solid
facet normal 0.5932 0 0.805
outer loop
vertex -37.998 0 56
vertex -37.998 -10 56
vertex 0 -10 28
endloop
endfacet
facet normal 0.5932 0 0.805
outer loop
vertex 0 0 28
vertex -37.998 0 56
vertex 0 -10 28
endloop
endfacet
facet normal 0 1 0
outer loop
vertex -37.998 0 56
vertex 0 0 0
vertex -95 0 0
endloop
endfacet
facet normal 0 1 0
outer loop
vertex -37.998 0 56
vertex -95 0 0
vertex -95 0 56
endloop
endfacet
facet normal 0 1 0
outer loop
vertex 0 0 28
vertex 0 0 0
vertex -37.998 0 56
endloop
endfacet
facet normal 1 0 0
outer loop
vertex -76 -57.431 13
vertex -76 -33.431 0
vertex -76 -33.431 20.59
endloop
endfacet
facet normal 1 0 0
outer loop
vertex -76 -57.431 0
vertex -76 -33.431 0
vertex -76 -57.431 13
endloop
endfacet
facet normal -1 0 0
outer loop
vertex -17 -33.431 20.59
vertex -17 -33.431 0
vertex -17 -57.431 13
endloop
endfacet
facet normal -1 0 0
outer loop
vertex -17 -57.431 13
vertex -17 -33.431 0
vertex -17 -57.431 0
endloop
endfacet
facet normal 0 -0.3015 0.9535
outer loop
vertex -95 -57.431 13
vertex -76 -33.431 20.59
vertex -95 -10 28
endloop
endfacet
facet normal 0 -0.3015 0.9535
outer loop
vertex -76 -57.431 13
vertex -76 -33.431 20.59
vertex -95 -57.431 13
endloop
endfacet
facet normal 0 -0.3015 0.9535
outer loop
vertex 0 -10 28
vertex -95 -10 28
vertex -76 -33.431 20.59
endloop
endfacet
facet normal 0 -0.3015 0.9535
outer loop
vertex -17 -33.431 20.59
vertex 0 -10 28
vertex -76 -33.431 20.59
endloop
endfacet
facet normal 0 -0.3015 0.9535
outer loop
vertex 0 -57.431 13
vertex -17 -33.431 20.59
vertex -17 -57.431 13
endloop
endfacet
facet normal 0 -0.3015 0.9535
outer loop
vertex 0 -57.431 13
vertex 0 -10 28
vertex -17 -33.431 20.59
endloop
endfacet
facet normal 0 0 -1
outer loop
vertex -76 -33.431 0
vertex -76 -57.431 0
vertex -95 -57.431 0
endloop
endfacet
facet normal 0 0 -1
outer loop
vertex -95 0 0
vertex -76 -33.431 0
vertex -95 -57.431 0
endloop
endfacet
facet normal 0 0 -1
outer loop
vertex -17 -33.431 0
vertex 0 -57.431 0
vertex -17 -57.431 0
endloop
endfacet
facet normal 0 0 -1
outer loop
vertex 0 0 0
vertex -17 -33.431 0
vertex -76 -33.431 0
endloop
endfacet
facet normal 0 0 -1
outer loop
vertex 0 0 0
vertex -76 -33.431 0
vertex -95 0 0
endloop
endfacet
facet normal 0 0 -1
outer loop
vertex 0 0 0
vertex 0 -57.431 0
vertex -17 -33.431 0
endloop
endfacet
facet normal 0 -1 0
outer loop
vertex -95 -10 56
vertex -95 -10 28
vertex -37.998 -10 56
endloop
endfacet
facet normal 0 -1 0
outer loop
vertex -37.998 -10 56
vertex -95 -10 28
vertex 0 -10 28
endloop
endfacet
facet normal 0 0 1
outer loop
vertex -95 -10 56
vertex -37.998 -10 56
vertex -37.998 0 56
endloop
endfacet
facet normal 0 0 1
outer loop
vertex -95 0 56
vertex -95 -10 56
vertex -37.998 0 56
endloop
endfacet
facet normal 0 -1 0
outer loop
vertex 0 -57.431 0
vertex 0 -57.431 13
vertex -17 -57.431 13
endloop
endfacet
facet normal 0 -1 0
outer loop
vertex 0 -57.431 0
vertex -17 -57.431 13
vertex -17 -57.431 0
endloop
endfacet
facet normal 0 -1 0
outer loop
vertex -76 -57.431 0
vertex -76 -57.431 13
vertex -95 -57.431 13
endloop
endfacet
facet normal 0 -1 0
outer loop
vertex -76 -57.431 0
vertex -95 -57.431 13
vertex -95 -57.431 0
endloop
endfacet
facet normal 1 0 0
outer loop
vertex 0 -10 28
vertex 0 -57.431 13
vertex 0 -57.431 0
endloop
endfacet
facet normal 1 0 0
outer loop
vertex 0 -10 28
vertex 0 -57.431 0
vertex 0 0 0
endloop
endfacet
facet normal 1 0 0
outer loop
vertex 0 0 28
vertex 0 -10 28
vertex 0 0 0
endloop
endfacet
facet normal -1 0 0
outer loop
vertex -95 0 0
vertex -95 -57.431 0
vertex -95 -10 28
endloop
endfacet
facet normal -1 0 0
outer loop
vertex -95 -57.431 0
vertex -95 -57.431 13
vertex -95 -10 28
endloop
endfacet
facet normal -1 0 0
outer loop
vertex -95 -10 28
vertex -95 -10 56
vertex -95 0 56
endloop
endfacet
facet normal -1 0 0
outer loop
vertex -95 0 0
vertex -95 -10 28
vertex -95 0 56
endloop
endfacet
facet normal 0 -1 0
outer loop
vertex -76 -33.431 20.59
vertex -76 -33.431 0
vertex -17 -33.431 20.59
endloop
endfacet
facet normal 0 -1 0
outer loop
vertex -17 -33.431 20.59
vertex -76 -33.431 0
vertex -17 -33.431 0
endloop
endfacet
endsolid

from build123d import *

# Parameters (mm, degrees)
F0_W     = 10
F0_H     = 28
F1_DEPTH = 95
F3_DEPTH = 10
F4_W     = 59
F4_H     = 24
F5_DEPTH = 62.4


with BuildPart() as f1:
    # F0 (on Right) → F1 (new body)
    with BuildSketch(Plane.YZ):
        Polygon((-57.430514, 0), (0, 0), (0, 28), (-10, 28), (-57.430514, 13), align=None)
        with Locations((-5, 42)):
            Rectangle(F0_W, F0_H)
    extrude(amount=-F1_DEPTH)

    # F2 (on face) → F3 (cut)
    with BuildSketch(Plane.XZ.offset(10)):
        Polygon((0, 56), (-37.998203, 56), (0, 28), align=None)
    extrude(amount=-F3_DEPTH, mode=Mode.SUBTRACT)

    # F4 (on face) → F5 (cut)
    with BuildSketch(Plane(origin=(0, 0, 0), x_dir=(1, 0, 0), z_dir=(0, 0, -1))):
        with Locations((-46.5, 45.430514)):
            Rectangle(F4_W, F4_H)
    extrude(amount=-F5_DEPTH, mode=Mode.SUBTRACT)


solid = f1.part
